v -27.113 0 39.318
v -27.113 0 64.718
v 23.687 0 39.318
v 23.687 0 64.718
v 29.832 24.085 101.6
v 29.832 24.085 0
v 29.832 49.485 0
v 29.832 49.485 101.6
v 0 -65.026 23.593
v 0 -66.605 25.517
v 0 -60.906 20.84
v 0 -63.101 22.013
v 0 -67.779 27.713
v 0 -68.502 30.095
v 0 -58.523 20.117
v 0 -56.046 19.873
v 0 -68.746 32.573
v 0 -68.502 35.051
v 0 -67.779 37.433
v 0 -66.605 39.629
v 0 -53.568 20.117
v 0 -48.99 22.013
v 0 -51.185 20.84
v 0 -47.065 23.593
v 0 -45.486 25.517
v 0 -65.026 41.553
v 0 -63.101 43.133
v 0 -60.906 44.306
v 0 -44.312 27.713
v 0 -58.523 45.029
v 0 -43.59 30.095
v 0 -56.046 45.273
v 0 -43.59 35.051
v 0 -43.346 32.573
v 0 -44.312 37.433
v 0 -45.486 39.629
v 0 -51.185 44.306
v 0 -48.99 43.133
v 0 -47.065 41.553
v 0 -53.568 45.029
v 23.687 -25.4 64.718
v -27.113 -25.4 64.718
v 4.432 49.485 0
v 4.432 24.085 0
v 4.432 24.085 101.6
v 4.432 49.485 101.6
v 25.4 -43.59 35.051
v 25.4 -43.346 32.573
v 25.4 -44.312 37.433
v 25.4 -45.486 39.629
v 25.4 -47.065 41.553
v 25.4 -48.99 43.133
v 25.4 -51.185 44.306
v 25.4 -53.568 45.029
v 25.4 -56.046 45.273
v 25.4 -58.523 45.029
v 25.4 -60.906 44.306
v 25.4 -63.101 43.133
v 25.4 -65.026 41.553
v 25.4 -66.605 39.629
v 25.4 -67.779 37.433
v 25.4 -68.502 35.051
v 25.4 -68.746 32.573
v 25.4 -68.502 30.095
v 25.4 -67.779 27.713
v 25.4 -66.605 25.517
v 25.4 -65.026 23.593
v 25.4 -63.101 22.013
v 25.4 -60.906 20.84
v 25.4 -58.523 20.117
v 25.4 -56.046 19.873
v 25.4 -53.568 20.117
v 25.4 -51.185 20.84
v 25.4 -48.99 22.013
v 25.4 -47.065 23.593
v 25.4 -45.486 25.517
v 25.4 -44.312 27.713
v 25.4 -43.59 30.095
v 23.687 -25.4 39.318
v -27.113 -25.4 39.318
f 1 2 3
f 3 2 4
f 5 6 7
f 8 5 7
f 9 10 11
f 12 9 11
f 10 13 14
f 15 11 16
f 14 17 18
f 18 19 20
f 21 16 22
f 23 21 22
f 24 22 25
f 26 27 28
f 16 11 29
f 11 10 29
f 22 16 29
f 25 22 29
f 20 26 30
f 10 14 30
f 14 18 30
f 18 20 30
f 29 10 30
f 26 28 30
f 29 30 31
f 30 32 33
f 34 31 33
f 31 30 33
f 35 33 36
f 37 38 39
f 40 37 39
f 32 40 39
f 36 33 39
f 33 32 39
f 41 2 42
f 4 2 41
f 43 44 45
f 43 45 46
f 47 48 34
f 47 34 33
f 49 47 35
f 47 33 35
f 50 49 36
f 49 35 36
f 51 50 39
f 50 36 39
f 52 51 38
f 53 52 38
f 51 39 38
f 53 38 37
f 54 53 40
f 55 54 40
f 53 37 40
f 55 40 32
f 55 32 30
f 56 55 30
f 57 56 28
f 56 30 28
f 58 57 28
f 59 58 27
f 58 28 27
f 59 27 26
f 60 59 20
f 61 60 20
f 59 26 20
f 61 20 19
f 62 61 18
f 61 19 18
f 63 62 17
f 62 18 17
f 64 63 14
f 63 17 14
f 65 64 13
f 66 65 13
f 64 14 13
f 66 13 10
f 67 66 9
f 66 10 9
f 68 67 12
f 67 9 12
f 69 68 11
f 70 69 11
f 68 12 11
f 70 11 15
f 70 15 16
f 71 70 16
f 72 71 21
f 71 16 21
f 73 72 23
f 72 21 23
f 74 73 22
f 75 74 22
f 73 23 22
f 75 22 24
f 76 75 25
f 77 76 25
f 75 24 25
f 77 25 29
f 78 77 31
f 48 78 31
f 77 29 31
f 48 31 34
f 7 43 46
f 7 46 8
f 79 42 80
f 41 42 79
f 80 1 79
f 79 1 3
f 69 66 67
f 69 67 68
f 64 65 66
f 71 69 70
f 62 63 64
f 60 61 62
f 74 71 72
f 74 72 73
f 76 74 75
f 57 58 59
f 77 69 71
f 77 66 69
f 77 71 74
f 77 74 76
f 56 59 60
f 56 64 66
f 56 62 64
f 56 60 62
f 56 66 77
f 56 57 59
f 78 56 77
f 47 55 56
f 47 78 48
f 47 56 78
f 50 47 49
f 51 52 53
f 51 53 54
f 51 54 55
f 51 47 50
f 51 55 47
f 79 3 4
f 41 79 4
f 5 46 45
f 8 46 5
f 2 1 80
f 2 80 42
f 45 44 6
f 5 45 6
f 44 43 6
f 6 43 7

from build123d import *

# Parameters (mm, degrees)
F0_W     = 50.8
F0_H     = 25.4
F1_DEPTH = 25.4
F2_W     = 25.4
F2_H     = 25.4
F3_DEPTH = 101.6
F4_R     = 12.7
F5_DEPTH = 25.4
F6_DEPTH = 25.4


with BuildPart() as f1:
    # F0 (on Front) → F1 (new body)
    with BuildSketch(Plane.XZ):
        with Locations((-1.712927, 52.017765)):
            Rectangle(F0_W, F0_H)
    extrude(amount=F1_DEPTH)


with BuildPart() as f3:
    # F2 (on Top) → F3 (new body)
    with BuildSketch(Plane.XY):
        with Locations((17.131958, 36.785443)):
            Rectangle(F2_W, F2_H)
    extrude(amount=F3_DEPTH)


with BuildPart() as f5:
    # F4 (on Right) → F5 (new body)
    with BuildSketch(Plane.YZ):
        with Locations((-56.045547, 32.573104)):
            Circle(F4_R)
    extrude(amount=F5_DEPTH)

    # F4 (on Right) → F6 (join)
    with BuildSketch(Plane.YZ):
        with Locations((-56.045547, 32.573104)):
            Circle(F4_R)
    extrude(amount=F6_DEPTH)


solid = Compound([f1.part, f3.part, f5.part])
